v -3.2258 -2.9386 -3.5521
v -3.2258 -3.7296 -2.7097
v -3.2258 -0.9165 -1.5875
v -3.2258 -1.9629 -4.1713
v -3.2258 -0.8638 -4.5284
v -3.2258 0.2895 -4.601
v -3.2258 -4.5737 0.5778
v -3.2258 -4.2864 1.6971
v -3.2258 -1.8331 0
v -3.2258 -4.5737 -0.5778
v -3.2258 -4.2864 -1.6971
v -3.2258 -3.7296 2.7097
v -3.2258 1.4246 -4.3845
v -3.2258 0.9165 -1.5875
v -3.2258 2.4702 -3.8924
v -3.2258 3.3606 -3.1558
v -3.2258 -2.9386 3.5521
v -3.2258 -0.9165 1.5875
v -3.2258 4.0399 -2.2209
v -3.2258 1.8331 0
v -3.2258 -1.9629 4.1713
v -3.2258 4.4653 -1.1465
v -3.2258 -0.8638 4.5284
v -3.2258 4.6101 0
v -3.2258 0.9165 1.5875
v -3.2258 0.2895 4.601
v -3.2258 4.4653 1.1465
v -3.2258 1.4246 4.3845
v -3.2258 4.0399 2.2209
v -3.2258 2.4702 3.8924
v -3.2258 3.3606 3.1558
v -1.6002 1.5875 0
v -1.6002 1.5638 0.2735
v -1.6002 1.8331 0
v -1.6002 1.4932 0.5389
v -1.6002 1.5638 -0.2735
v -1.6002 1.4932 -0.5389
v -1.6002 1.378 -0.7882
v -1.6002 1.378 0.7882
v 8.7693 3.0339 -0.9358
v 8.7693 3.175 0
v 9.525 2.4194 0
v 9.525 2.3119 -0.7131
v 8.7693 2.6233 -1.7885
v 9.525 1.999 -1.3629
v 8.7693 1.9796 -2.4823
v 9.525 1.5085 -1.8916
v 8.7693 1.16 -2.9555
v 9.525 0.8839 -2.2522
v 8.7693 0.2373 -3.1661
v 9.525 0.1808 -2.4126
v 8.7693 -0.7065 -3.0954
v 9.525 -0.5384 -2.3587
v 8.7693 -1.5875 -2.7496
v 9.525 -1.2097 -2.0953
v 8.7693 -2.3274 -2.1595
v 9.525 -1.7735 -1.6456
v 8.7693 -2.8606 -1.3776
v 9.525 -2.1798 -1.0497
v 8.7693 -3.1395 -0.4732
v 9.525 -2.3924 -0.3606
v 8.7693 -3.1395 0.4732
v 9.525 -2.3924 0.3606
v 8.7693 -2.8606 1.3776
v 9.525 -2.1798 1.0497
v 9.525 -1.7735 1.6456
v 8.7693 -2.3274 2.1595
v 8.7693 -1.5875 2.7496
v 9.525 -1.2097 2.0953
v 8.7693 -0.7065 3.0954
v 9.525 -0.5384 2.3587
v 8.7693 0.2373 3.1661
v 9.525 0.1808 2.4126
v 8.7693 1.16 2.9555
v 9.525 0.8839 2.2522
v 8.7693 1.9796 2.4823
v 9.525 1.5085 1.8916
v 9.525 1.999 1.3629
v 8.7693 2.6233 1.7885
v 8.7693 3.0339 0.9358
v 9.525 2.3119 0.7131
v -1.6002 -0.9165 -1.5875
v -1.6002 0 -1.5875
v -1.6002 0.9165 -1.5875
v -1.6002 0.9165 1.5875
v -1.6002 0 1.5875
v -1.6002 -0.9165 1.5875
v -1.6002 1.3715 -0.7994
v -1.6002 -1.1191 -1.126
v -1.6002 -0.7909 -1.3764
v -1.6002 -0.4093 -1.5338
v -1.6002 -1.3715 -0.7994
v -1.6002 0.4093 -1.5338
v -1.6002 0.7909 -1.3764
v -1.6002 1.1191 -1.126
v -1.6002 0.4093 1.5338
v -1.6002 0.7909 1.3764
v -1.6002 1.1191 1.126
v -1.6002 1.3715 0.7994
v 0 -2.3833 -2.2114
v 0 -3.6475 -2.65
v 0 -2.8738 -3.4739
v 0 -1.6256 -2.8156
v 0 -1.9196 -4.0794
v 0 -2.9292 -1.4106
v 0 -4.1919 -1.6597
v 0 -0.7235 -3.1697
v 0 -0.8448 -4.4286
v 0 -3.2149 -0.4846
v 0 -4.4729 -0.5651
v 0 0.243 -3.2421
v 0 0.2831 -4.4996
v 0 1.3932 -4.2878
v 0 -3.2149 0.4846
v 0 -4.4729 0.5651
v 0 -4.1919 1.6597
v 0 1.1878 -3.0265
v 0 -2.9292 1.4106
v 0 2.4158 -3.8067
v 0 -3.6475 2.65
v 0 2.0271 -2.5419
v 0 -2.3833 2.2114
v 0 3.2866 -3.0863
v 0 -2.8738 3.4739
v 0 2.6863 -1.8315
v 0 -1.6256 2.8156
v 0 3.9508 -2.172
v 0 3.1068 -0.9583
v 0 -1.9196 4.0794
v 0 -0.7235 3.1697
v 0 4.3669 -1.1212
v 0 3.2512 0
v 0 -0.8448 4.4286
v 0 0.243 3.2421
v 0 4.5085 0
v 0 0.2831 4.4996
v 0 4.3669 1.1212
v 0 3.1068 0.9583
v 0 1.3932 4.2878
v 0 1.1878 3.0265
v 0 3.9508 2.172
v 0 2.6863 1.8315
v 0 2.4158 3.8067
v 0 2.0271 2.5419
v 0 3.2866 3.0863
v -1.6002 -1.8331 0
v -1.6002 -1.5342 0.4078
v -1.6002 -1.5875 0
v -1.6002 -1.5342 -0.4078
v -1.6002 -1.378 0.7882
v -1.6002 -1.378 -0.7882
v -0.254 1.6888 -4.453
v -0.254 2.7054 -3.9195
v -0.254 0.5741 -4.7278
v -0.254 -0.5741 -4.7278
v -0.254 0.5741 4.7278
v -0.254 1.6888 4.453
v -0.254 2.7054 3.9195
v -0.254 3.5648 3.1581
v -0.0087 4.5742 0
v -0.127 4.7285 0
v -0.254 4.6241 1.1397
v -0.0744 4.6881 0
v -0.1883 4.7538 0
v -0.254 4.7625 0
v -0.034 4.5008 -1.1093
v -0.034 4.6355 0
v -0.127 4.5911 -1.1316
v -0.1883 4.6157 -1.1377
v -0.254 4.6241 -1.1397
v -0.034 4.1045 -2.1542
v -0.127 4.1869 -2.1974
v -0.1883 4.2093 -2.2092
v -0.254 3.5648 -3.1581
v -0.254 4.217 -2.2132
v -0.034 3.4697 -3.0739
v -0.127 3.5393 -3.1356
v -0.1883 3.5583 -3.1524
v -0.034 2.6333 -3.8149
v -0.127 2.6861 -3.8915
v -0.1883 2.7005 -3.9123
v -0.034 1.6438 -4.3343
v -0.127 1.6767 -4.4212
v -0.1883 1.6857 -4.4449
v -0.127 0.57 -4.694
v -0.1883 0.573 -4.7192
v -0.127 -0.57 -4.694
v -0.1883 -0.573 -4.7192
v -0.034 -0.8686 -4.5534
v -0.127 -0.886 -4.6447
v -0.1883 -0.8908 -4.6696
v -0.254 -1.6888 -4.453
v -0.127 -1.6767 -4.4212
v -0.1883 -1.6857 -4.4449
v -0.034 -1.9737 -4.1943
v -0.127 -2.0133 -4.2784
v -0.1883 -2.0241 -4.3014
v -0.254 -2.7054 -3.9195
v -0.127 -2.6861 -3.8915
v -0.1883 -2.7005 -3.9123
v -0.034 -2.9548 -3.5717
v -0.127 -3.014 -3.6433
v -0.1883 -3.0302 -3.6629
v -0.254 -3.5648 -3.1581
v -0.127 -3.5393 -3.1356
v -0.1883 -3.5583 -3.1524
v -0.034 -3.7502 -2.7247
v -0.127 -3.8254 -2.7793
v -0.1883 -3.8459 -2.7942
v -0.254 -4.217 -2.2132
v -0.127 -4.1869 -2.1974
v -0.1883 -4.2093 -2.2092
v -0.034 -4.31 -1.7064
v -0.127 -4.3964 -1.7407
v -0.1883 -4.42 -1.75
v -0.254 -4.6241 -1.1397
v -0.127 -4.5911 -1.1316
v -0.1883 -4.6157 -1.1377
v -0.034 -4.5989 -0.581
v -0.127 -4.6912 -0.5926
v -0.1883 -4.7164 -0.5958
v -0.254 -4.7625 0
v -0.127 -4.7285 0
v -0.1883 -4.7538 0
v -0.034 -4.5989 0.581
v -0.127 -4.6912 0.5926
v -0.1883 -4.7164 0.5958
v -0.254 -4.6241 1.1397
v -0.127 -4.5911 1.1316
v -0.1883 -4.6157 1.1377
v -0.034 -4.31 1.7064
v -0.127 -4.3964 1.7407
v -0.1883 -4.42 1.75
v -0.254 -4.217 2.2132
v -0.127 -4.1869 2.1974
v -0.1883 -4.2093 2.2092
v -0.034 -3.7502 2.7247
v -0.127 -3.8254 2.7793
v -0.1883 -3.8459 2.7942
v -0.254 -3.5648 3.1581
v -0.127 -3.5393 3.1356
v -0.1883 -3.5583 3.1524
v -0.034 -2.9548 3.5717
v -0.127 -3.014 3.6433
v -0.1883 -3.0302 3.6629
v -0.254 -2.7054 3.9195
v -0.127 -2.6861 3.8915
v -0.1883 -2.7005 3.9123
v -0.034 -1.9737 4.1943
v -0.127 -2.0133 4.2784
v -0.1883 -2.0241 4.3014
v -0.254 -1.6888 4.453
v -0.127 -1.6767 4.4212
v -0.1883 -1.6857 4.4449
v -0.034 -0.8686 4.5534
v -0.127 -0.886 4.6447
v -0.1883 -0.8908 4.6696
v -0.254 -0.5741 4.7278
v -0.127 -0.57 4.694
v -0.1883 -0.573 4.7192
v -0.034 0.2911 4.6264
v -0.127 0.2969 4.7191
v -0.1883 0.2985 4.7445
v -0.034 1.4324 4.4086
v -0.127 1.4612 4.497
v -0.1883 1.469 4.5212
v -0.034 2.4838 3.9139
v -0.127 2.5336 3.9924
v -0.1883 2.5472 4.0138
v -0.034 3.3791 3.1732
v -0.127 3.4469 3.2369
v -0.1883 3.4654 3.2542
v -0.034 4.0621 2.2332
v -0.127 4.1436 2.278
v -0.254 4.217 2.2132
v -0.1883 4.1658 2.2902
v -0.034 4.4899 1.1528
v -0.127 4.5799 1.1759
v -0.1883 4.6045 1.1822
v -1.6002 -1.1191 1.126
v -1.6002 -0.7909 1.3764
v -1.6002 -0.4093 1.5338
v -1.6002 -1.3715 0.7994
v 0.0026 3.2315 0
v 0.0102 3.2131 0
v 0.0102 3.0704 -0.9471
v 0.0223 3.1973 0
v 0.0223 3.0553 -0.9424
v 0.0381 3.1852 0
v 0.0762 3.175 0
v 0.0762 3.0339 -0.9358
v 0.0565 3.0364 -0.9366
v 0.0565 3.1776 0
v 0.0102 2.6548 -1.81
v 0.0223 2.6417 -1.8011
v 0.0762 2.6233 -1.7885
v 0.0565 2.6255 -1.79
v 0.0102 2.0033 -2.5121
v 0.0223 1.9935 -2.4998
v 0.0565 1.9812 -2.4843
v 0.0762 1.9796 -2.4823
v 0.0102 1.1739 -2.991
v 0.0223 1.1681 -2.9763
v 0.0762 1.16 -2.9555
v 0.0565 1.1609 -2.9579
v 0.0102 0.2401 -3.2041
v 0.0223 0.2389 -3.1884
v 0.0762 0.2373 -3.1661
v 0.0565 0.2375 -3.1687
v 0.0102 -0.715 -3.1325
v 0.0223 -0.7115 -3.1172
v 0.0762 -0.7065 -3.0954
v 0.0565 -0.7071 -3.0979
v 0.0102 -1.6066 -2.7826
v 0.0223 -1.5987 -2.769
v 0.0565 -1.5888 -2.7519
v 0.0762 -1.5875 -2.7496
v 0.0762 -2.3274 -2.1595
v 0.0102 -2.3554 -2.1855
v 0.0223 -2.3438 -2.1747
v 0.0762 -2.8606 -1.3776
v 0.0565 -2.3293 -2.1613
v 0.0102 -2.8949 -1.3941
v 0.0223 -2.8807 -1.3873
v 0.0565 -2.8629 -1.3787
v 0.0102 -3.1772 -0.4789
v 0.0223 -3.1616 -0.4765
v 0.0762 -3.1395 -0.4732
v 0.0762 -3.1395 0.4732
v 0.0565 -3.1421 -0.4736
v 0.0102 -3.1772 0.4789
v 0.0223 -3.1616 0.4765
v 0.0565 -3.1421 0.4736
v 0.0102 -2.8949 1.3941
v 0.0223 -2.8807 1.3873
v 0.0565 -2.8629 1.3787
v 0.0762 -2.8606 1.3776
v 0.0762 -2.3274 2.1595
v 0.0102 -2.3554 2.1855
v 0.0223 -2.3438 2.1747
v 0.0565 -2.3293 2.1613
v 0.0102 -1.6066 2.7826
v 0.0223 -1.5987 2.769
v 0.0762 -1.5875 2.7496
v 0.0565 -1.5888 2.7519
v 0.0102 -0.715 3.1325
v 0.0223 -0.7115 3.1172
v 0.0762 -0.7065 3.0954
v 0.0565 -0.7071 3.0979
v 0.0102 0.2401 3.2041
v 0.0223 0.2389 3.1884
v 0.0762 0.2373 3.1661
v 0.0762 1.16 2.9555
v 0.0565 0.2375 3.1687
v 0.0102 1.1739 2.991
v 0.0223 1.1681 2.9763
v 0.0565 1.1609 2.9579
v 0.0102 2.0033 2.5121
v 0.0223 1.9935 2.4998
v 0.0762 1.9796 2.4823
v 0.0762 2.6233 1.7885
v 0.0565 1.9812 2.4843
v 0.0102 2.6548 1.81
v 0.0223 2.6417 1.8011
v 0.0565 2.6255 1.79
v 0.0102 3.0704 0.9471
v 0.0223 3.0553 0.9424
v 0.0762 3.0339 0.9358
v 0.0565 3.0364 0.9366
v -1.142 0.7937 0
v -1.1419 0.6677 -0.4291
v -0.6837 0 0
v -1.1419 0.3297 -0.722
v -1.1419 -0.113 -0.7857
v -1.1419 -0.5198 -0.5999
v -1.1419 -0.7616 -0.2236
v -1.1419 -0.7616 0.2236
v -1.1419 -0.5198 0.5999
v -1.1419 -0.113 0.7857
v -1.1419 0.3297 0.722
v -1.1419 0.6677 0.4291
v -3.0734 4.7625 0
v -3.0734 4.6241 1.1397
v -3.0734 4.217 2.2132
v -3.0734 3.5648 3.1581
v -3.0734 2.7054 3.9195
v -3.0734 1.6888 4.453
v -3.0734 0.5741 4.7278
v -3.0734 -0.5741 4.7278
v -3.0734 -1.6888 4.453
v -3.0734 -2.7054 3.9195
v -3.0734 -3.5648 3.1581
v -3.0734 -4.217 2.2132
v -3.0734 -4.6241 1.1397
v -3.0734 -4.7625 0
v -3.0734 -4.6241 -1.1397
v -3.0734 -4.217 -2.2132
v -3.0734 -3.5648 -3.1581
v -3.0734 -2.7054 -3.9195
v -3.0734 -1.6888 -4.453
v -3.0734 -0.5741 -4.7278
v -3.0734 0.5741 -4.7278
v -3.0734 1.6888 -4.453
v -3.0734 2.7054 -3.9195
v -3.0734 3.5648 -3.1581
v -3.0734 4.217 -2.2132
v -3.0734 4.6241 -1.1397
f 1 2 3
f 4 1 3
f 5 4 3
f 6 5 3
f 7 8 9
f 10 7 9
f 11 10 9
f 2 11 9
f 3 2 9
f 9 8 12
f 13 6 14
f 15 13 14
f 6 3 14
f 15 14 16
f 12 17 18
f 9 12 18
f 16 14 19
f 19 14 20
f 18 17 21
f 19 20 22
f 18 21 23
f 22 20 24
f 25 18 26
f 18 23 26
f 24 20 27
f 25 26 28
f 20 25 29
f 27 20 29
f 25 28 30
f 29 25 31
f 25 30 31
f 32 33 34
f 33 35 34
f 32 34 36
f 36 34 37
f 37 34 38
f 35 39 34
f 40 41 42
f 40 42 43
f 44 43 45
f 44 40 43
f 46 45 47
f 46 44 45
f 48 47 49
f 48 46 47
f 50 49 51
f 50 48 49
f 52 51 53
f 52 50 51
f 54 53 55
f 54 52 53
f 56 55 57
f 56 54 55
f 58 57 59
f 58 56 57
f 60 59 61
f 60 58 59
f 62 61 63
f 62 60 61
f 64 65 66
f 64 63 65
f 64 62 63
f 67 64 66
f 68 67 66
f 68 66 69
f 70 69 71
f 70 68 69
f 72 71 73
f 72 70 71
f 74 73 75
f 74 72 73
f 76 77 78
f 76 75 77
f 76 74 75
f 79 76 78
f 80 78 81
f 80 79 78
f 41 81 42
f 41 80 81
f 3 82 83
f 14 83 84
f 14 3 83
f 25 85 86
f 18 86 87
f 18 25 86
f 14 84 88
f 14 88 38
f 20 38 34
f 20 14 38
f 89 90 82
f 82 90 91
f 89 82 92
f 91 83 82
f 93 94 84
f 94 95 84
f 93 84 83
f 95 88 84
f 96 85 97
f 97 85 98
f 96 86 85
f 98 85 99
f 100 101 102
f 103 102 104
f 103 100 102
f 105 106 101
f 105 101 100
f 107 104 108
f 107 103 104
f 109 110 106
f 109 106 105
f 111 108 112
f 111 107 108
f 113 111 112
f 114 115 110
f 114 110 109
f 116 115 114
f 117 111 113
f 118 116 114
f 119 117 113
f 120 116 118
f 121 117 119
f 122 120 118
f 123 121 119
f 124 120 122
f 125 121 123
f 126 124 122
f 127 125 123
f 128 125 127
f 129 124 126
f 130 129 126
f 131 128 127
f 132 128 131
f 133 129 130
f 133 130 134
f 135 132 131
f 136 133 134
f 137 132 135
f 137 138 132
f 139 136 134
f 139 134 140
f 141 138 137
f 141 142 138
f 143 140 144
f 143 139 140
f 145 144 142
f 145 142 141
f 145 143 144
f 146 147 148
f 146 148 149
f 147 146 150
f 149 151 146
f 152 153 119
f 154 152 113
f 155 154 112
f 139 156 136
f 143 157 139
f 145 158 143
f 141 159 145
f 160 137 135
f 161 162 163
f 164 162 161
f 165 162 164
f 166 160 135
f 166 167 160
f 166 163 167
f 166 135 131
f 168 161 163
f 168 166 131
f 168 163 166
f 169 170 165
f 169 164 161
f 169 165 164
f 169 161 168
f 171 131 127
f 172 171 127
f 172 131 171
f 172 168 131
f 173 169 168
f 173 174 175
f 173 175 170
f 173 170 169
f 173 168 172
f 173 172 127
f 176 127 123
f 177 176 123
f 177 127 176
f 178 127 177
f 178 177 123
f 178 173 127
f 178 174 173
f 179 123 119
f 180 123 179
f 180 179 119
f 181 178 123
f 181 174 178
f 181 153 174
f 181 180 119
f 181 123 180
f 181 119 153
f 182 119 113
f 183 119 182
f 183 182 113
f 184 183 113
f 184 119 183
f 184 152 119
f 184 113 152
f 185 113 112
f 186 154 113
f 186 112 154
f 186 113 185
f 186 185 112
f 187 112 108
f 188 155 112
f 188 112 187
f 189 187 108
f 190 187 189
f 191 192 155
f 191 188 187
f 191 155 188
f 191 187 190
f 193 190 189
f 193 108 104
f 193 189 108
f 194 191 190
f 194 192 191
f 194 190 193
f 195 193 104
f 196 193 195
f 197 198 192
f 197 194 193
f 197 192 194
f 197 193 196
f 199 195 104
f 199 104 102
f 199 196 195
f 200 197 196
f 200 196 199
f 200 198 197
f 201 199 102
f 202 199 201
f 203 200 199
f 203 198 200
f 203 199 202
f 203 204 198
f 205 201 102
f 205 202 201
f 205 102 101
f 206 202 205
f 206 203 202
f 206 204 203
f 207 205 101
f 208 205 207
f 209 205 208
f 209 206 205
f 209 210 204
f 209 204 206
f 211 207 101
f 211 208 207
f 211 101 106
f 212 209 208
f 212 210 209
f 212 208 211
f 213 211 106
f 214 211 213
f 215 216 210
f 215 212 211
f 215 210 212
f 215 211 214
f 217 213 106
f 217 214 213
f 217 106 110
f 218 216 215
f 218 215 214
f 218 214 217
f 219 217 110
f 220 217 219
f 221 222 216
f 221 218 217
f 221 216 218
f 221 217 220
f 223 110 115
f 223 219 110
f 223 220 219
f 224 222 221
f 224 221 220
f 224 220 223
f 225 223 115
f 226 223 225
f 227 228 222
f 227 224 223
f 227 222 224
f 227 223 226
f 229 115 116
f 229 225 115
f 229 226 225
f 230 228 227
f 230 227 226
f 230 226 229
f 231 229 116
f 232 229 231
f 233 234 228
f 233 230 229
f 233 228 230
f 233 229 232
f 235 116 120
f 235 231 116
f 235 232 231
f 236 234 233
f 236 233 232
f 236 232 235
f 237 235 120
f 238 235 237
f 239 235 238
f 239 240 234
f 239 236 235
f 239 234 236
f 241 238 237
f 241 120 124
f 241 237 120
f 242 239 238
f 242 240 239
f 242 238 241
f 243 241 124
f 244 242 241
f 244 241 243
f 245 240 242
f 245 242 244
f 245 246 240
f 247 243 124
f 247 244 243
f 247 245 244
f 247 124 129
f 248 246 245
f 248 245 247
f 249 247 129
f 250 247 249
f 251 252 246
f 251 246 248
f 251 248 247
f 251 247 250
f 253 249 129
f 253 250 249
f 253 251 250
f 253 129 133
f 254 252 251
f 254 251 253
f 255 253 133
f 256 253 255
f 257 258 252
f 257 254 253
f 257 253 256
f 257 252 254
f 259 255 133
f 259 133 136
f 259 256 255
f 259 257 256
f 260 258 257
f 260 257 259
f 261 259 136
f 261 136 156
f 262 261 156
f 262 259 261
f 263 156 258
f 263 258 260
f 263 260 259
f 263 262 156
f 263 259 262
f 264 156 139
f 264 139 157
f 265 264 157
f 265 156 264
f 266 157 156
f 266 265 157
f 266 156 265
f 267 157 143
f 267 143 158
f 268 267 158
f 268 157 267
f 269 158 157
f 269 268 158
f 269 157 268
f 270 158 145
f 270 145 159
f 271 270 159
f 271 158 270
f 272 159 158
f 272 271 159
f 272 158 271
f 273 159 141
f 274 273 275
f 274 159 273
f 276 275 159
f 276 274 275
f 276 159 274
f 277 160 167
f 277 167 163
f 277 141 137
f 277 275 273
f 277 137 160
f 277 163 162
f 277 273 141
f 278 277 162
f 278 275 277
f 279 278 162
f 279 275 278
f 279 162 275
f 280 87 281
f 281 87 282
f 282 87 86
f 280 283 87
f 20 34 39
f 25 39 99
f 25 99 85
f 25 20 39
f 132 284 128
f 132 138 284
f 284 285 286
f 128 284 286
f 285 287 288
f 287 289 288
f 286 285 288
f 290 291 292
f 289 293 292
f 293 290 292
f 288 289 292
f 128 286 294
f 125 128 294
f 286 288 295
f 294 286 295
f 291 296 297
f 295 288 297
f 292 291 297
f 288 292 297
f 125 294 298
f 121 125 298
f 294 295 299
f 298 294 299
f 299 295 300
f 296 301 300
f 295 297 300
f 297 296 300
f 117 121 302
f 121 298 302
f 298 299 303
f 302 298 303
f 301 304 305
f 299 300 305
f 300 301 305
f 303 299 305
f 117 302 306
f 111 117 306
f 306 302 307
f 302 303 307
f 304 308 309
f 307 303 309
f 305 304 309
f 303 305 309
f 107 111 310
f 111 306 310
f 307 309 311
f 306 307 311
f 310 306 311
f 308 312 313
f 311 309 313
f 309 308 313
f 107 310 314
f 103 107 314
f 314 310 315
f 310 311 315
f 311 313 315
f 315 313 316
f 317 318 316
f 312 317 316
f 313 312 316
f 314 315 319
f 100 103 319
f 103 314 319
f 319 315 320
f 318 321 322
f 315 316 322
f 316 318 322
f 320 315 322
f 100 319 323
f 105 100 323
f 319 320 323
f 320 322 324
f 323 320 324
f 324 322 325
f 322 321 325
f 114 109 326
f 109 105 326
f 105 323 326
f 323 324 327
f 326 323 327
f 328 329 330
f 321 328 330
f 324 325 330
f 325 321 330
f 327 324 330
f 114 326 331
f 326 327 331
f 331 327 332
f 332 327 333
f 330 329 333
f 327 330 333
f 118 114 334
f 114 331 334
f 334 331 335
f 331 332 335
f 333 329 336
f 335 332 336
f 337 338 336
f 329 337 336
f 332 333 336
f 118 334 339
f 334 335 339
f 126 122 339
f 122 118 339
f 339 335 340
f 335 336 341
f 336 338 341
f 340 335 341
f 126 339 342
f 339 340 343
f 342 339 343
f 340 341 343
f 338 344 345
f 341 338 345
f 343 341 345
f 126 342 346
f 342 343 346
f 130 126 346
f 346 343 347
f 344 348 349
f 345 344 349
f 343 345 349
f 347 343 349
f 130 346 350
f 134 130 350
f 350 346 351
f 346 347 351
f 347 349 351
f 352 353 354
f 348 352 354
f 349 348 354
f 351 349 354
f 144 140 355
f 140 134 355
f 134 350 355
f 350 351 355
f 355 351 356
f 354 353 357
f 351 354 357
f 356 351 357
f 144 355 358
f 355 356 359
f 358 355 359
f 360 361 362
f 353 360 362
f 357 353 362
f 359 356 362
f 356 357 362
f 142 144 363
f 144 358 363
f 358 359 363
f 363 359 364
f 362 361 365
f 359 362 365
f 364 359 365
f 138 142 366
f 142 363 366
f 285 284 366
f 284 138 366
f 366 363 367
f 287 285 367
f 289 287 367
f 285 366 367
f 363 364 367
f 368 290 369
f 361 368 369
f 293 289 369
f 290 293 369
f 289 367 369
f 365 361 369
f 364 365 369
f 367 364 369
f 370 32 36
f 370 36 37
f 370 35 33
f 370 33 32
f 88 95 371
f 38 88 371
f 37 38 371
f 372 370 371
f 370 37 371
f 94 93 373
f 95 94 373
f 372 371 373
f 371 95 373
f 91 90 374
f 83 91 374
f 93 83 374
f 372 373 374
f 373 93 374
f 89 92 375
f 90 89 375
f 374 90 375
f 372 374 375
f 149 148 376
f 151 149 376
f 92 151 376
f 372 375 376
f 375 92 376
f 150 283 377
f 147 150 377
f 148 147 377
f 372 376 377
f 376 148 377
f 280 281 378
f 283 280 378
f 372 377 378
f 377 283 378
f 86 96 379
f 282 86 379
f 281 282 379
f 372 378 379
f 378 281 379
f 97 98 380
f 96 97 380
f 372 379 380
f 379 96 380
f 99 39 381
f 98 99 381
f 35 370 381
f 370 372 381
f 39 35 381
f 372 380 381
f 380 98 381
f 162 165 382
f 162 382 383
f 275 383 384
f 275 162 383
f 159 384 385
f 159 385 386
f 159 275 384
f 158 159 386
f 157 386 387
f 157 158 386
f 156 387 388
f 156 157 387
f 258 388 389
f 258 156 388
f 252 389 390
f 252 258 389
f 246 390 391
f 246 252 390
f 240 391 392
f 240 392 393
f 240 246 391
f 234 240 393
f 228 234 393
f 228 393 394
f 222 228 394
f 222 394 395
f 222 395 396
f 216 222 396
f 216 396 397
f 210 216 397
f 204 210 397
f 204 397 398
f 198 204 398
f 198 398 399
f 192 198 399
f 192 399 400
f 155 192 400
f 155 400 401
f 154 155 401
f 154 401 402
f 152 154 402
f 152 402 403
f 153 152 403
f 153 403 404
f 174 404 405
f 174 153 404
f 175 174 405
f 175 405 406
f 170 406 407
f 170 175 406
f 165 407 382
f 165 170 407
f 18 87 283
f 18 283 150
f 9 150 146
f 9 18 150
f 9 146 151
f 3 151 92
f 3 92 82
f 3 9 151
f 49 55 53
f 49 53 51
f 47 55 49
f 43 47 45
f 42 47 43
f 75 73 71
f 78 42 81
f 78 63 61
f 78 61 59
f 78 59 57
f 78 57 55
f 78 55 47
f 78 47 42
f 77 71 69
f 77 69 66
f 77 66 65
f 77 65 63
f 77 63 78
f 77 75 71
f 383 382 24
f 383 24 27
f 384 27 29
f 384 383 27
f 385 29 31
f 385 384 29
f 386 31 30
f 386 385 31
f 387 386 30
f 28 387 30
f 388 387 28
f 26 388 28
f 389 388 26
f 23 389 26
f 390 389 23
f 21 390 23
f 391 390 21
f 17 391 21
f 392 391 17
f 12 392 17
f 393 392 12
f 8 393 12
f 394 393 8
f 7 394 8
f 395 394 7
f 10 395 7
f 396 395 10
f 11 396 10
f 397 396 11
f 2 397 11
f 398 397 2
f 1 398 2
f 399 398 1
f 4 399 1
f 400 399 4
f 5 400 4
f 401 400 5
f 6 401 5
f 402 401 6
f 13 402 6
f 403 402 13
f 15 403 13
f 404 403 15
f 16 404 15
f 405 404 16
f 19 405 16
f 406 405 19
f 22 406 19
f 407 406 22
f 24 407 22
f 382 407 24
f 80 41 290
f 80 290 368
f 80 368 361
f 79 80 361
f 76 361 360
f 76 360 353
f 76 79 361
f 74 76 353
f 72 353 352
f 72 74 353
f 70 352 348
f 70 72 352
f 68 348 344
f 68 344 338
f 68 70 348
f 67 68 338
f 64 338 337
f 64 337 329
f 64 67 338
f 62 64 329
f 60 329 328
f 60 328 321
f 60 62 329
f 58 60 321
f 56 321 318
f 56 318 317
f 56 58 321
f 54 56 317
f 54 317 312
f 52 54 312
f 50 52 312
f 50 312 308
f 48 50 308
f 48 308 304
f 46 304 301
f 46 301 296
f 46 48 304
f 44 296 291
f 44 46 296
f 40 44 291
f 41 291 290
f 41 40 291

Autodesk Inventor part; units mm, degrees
sketch "Sketch_1" plane through (0, 0, 0) normal (0, 0, 1) x (1, 0, 0)
  line L0 (9.525, 0) -> (-3.2258, 0)
  line L1 (-3.2258, 0) -> (-3.2258, 4.6101)
  line L2 (-3.2258, 4.6101) -> (-3.0734, 4.7625)
  line L3 (-3.0734, 4.7625) -> (-0.254, 4.7625)
  arc A0 (0, 4.5085) -> (-0.254, 4.7625) centre (-0.254, 4.5085) ccw
  line L4 (0, 4.5085) -> (0, 3.2512)
  arc A1 (0, 3.2512) -> (0.0762, 3.175) centre (0.0762, 3.2512) ccw
  line L5 (0.0762, 3.175) -> (8.7693, 3.175)
  line L6 (8.7693, 3.175) -> (9.525, 2.4194)
  line L7 (9.525, 2.4194) -> (9.525, 0)
  line L8 (9.525, 0) -> (-3.2258, 0)
revolve "Revolution1" add sketch "Sketch_1" angle 360 about axis through (9.525, 0, 0) along (1, 0, 0)
thread "Thread1" size "1/4-20 UNC" class "2A" standard "ANSI Unified Screw Threads" length 6.3881
sketch "Sketch_3" plane through (-3.2258, 0, 0) normal (1, 0, 0) x (0, 0, -1)
  line L0 (-1.5875, -0.9165) -> (0, -1.8331)
  line L1 (0, -1.8331) -> (1.5875, -0.9165)
  line L2 (1.5875, -0.9165) -> (1.5875, 0.9165)
  line L3 (1.5875, 0.9165) -> (0, 1.8331)
  line L4 (0, 1.8331) -> (-1.5875, 0.9165)
  line L5 (-1.5875, 0.9165) -> (-1.5875, -0.9165)
extrude "Extrusion1" cut sketch "Sketch_3" along normal blind 1.6256
sketch "Sketch_4" plane through (0, 0, 0) normal (0, 0, 1) x (1, 0, 0)
  line L0 (-0.6837, 0) -> (-1.6002, 0)
  line L1 (-1.6002, 0) -> (-1.6002, 1.5875)
  line L2 (-1.6002, 1.5875) -> (-0.6837, 0)
  line L3 (-0.6837, 0) -> (-1.6002, 0)
revolve "Revolution2" cut sketch "Sketch_4" angle 360 about axis through (-0.6837, 0, 0) along (1, 0, 0)
ref_plane "screw_XY" through (0, 0, 0) normal (1, 0, 0) x (0, 0, -1)
ref_plane "screw_YZ" through (0, 0, 0) normal (0, 0, -1) x (0, 1, 0)
ref_plane "screw_ZX" through (0, 0, 0) normal (0, 1, 0) x (1, 0, 0)
ref_plane "screw1_XY" through (9.525, 0, 0) normal (1, 0, 0) x (0, 0, -1)
ref_plane "screw1_YZ" through (9.525, 0, 0) normal (0, 0, -1) x (0, 1, 0)
ref_plane "screw1_ZX" through (9.525, 0, 0) normal (0, 1, 0) x (1, 0, 0)
ref_plane "screw2_XY" through (4.445, 0, 0) normal (1, 0, 0) x (0, 0, -1)
ref_plane "screw2_YZ" through (4.445, 0, 0) normal (0, 0, -1) x (0, 1, 0)
ref_plane "screw2_ZX" through (4.445, 0, 0) normal (0, 1, 0) x (1, 0, 0)
ref_plane "to_tnut_XY" through (7.366, 0, 0) normal (1, 0, 0) x (0, 0, -1)
ref_plane "to_tnut_YZ" through (7.366, 0, 0) normal (0, 0, -1) x (0, 1, 0)
ref_plane "to_tnut_ZX" through (7.366, 0, 0) normal (0, 1, 0) x (1, 0, 0)
properties part number "2750-0.250"
